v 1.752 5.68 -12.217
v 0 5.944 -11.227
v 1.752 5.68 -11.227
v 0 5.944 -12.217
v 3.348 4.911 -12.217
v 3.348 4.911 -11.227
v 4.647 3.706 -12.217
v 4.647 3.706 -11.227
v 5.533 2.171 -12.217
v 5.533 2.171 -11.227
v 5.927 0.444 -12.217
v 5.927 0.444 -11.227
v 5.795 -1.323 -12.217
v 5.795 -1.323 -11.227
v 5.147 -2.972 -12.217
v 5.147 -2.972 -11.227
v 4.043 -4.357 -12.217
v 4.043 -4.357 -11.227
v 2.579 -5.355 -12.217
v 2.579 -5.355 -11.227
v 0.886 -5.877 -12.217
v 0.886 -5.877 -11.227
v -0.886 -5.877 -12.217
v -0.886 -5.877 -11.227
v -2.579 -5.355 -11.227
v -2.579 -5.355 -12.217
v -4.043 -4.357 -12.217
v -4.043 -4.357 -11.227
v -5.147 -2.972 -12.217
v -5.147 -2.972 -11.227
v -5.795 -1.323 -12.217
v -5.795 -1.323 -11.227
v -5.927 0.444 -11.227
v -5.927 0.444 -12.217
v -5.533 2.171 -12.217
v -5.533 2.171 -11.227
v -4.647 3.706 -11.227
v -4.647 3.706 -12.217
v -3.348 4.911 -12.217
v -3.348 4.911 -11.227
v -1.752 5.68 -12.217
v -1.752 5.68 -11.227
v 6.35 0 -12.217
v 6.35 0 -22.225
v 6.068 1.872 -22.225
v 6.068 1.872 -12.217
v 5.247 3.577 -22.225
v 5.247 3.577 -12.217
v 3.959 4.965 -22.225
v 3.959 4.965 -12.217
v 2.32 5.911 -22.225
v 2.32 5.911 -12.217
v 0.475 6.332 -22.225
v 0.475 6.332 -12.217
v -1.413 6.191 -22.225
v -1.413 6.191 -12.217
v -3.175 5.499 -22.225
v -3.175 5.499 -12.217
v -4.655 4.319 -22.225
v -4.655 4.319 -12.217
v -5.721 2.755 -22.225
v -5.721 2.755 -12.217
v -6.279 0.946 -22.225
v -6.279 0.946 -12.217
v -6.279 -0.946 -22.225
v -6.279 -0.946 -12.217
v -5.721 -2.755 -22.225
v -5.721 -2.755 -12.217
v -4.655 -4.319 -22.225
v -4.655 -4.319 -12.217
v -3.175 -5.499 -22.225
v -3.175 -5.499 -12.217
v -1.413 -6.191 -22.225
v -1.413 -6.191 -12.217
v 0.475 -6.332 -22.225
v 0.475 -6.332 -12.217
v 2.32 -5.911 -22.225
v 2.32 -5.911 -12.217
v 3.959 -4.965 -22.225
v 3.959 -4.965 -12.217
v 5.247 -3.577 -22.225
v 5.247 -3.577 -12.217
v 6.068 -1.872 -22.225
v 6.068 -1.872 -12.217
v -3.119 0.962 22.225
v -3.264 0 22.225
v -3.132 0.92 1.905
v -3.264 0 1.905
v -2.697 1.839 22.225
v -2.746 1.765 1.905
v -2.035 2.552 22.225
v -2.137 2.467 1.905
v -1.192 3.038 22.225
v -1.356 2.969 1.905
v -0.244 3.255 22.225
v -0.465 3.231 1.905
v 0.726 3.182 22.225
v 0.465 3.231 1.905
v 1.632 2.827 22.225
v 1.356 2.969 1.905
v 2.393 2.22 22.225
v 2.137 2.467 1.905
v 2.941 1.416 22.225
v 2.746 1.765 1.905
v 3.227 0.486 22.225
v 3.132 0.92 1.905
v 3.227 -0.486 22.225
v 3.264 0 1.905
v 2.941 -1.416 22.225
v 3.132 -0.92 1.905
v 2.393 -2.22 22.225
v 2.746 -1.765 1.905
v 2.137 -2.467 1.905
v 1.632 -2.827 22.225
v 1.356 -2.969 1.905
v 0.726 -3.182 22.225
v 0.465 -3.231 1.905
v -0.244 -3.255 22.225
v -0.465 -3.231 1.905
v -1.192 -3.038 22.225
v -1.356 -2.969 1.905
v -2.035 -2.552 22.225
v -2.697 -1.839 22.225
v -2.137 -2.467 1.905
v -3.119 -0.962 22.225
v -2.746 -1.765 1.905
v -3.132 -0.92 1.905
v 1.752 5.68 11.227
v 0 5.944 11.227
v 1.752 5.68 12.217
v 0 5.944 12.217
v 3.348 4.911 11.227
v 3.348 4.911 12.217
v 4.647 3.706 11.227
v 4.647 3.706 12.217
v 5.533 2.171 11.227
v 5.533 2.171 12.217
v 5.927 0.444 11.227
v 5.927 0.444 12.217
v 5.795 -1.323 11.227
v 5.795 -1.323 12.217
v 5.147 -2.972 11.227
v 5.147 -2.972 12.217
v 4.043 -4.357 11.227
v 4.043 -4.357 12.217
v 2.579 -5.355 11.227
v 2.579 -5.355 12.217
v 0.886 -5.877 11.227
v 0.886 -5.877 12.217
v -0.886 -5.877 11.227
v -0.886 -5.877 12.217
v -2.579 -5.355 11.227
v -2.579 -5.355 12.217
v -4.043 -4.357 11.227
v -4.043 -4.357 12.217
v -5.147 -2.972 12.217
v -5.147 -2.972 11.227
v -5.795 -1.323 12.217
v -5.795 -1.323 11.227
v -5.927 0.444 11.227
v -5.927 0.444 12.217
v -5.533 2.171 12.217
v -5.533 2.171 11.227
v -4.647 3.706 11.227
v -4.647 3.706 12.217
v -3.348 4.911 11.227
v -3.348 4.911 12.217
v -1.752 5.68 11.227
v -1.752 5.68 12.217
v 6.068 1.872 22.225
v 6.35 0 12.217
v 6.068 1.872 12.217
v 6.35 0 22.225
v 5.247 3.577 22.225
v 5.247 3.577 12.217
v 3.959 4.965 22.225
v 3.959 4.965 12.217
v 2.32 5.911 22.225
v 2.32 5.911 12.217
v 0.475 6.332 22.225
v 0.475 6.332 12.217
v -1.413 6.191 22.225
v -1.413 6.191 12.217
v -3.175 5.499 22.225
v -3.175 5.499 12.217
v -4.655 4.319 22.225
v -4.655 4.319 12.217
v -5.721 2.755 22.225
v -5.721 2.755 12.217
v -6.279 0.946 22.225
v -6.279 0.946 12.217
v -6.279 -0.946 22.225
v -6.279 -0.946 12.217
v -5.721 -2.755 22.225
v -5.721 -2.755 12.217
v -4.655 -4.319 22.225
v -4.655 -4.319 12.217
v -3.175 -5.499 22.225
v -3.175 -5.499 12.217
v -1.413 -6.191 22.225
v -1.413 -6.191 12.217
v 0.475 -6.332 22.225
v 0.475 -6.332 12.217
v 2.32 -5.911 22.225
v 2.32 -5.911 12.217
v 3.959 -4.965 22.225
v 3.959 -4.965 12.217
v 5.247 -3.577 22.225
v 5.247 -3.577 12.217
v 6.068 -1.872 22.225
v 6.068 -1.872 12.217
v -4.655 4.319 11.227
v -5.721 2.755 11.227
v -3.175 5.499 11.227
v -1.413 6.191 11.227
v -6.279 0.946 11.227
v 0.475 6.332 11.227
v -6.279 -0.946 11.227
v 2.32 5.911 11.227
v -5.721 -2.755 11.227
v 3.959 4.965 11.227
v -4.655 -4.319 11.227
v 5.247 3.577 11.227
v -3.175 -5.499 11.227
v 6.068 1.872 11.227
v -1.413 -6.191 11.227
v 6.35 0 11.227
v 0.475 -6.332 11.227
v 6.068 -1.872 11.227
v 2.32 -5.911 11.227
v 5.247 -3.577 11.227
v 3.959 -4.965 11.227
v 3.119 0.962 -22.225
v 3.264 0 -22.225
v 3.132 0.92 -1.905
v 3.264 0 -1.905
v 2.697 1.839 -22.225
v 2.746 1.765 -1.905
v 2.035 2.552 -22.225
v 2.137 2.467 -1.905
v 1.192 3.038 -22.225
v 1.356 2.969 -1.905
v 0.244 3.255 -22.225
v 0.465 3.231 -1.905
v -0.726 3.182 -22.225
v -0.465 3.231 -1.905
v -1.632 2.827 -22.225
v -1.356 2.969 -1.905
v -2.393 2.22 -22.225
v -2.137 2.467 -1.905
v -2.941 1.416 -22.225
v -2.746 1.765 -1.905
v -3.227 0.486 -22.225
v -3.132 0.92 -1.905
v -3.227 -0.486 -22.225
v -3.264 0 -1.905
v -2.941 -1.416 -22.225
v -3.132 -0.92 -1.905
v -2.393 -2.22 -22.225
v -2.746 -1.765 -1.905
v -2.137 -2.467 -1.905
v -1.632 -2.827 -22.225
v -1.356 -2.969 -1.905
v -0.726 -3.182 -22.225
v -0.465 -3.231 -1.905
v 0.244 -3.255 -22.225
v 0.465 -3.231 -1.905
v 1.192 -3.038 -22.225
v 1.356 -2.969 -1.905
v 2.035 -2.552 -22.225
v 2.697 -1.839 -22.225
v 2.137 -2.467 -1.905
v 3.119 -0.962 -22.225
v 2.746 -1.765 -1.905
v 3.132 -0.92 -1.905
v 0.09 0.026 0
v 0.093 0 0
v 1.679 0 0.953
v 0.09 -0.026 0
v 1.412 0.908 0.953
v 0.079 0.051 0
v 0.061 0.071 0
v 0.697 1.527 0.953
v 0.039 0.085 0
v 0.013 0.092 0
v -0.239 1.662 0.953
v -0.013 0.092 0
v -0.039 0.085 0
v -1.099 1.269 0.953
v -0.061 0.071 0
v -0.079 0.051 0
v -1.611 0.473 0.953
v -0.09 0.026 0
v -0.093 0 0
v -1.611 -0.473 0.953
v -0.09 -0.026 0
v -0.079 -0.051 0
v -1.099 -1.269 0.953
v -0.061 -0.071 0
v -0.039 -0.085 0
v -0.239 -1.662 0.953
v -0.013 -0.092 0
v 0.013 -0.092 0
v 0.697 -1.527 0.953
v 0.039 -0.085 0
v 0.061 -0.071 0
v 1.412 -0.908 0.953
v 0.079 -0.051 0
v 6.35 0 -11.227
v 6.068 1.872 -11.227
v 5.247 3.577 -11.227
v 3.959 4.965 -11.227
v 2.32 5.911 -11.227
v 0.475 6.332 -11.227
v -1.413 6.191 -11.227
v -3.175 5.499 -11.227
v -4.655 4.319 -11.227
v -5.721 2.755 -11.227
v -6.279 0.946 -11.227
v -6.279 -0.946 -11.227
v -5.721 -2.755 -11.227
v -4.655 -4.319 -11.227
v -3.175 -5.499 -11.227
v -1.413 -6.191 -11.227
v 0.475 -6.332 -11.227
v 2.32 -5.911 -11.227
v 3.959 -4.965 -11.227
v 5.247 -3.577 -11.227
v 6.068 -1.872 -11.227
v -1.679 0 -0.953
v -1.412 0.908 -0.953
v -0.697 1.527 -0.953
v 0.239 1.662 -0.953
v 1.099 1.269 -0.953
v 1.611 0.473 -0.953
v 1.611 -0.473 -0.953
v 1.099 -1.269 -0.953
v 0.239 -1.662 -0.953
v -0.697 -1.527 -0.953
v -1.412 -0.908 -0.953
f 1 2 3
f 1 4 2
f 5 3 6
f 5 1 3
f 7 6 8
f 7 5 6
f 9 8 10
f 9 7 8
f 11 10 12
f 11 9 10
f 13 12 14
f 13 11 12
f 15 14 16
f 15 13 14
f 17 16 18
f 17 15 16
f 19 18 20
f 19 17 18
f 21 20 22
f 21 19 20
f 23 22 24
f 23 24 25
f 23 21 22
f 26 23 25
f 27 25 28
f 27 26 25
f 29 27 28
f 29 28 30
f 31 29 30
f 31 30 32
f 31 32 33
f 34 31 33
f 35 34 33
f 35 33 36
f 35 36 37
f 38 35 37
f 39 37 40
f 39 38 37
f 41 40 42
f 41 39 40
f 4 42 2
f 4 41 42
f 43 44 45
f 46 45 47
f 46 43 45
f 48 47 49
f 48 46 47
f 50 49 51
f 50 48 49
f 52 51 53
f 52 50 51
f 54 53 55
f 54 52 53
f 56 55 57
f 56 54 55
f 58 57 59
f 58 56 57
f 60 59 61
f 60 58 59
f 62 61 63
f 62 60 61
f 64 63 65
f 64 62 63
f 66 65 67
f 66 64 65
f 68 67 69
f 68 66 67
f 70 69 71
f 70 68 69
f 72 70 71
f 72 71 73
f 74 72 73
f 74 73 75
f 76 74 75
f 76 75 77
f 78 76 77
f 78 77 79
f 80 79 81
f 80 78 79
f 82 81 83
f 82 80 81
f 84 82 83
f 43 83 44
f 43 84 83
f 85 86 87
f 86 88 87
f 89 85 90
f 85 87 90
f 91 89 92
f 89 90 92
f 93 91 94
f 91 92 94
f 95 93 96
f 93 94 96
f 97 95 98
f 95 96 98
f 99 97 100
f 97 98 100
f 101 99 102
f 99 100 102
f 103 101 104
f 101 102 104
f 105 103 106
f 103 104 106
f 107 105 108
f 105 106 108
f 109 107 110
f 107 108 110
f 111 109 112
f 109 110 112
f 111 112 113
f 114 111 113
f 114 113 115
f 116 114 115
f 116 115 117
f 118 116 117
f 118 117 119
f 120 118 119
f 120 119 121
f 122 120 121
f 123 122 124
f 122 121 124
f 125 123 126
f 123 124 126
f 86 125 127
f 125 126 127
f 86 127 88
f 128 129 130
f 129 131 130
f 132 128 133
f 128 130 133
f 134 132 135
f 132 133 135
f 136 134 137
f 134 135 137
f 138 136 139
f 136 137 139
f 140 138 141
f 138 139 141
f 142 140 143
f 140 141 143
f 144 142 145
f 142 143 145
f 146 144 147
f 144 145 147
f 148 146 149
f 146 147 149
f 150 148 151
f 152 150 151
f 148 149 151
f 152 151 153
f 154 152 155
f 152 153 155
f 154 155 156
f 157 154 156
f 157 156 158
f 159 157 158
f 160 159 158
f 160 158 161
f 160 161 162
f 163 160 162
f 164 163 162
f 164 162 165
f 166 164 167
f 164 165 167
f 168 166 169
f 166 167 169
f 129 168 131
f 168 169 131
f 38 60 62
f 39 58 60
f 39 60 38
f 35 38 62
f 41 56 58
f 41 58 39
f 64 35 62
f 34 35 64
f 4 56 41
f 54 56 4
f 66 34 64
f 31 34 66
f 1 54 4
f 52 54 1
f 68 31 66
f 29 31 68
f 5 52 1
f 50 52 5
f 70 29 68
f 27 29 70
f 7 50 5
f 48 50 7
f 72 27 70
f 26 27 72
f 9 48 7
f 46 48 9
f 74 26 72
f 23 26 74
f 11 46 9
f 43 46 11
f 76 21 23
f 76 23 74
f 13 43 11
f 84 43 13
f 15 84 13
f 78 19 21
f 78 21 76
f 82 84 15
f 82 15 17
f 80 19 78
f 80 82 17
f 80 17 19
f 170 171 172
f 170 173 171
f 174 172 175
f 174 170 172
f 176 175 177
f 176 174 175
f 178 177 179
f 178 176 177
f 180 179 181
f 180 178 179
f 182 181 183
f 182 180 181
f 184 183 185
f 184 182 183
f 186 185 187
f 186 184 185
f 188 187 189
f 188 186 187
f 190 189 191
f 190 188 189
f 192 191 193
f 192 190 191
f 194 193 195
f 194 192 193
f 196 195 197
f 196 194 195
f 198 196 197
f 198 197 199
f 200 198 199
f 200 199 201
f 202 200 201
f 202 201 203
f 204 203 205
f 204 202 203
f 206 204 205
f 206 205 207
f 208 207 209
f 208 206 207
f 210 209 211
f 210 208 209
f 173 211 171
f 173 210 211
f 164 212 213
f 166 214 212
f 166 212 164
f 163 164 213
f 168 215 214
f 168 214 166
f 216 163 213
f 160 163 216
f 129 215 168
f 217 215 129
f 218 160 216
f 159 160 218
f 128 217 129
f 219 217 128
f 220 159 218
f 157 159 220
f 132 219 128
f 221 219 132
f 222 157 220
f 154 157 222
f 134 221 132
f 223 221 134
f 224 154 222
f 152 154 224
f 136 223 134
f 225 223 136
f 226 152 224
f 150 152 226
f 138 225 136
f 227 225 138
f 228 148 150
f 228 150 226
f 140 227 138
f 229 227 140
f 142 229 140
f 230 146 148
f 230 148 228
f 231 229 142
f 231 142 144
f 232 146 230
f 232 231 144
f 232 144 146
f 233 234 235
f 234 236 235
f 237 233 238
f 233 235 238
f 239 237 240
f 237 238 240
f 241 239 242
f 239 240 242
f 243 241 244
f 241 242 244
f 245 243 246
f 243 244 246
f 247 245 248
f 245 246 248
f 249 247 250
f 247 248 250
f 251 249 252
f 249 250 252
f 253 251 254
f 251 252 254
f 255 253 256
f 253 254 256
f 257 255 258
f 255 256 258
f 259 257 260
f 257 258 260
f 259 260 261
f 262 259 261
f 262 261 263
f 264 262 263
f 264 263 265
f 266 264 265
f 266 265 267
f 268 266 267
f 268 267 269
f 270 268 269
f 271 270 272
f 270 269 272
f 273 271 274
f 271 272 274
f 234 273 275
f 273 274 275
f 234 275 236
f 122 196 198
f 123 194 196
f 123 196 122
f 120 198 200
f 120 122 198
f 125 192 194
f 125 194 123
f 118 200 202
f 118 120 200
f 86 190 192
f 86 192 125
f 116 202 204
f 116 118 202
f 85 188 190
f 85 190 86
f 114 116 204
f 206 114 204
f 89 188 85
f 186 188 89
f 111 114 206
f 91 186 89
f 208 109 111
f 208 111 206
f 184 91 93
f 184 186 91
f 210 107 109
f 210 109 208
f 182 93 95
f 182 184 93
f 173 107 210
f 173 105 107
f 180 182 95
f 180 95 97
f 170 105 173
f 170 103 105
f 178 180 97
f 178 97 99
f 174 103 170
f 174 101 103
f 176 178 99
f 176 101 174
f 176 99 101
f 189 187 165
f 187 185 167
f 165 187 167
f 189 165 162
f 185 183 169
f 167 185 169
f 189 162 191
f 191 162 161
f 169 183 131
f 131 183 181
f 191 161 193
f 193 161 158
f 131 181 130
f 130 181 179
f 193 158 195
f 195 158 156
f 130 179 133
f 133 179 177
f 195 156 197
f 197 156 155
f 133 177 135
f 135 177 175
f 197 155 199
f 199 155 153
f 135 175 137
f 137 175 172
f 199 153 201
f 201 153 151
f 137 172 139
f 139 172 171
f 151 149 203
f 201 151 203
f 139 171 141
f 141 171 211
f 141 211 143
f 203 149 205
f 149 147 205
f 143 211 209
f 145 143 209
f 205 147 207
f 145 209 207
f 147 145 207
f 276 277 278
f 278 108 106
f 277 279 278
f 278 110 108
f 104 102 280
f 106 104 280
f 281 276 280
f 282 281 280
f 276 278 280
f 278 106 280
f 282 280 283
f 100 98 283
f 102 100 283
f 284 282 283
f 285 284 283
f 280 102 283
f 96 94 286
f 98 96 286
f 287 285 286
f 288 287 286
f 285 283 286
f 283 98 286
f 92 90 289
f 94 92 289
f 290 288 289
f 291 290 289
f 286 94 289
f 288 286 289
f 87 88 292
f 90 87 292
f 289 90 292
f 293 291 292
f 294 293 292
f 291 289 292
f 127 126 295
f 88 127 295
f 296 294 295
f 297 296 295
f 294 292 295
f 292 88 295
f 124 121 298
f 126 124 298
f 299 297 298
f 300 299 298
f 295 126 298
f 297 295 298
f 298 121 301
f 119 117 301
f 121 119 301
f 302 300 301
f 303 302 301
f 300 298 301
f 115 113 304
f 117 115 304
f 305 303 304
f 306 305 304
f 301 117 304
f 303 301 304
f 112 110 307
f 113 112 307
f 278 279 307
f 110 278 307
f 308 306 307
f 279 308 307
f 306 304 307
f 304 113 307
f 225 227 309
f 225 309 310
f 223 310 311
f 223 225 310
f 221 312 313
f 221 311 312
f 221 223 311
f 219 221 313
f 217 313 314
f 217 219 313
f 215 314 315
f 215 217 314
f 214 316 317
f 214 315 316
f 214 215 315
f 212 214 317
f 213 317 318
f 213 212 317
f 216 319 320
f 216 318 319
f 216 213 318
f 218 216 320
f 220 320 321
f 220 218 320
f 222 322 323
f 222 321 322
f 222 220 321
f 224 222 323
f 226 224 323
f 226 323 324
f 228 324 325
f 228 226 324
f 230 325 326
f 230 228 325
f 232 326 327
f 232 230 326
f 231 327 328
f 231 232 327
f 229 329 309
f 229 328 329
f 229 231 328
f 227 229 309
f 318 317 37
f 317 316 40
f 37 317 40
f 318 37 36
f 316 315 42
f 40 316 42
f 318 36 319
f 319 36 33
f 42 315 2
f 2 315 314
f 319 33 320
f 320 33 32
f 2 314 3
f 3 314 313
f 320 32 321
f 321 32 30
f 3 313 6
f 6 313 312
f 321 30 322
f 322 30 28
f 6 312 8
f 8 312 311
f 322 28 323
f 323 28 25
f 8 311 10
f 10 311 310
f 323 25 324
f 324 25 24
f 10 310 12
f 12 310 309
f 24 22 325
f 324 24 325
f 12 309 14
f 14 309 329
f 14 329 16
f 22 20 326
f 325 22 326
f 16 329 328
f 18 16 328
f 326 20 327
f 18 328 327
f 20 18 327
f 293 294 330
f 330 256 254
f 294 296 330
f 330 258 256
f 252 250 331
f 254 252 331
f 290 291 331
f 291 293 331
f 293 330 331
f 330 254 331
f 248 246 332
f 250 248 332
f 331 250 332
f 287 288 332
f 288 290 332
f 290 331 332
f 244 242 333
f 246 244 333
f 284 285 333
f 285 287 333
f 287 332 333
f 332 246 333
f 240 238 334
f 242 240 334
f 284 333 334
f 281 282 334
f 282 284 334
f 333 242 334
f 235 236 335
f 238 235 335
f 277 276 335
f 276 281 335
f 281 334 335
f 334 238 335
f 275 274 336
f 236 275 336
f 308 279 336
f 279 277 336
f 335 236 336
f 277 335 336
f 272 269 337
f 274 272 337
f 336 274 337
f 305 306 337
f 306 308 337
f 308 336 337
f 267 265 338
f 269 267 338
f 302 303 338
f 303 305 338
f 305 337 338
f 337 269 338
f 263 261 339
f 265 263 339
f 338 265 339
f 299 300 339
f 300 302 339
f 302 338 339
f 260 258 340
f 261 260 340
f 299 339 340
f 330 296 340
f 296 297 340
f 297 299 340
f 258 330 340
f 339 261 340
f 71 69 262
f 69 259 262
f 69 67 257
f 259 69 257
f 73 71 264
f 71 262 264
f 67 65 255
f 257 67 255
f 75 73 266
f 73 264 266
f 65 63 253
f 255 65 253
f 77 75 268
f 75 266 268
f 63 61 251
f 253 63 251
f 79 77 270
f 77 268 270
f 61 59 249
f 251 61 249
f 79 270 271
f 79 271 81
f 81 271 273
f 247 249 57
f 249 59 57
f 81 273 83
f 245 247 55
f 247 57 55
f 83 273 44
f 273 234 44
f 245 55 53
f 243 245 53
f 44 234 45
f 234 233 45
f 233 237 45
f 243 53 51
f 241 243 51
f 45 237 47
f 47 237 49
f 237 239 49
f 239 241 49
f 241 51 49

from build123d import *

# Parameters (mm, degrees)
SKETCH1_R                    = 6.35
EXTRUDE1_DEPTH               = 22.225
F_5_16_18_TAPPED_HOLE1_D     = 6.5278
F_5_16_18_TAPPED_HOLE1_DEPTH = 20.32
F_5_16_18_TAPPED_HOLE1_TIP   = 1.961148974
F_5_16_18_TAPPED_HOLE2_D     = 6.5278
F_5_16_18_TAPPED_HOLE2_DEPTH = 20.32
F_5_16_18_TAPPED_HOLE2_TIP   = 1.961148974
SKETCH6_W                    = 0.9906
SKETCH6_H                    = 0.4064


with BuildPart() as part:
    # Sketch1 → Extrude1 (new body, symmetric)
    with BuildSketch(Plane.XY):
        Circle(SKETCH1_R)
    extrude(amount=EXTRUDE1_DEPTH, both=True)

    # 5/16-18 Tapped Hole1
    with Locations(Plane.XY.offset(22.225)):
        with Locations((0, 0)):
            Hole(F_5_16_18_TAPPED_HOLE1_D / 2, depth=F_5_16_18_TAPPED_HOLE1_DEPTH)
            with Locations((0, 0, -(F_5_16_18_TAPPED_HOLE1_DEPTH + F_5_16_18_TAPPED_HOLE1_TIP / 2))):  # 118° drill point
                Cone(0, F_5_16_18_TAPPED_HOLE1_D / 2, F_5_16_18_TAPPED_HOLE1_TIP, mode=Mode.SUBTRACT)

    # 5/16-18 Tapped Hole2
    with Locations(Plane(origin=(0, 0, -22.225), x_dir=(-1, 0, 0), z_dir=(0, 0, -1))):
        with Locations((0, 0)):
            Hole(F_5_16_18_TAPPED_HOLE2_D / 2, depth=F_5_16_18_TAPPED_HOLE2_DEPTH)
            with Locations((0, 0, -(F_5_16_18_TAPPED_HOLE2_DEPTH + F_5_16_18_TAPPED_HOLE2_TIP / 2))):  # 118° drill point
                Cone(0, F_5_16_18_TAPPED_HOLE2_D / 2, F_5_16_18_TAPPED_HOLE2_TIP, mode=Mode.SUBTRACT)

    # Sketch6 → Cut-Revolve1 (revolve, cut)
    with BuildSketch(Plane(origin=(0, 0, 0), x_dir=(0, 0, -1), z_dir=(1, 0, 0))):
        with Locations((11.7221, 6.1468)):
            Rectangle(SKETCH6_W, SKETCH6_H)
    cut_revolve1 = revolve(axis=Axis((0, 0, 22.225), (0, 0, -1)), mode=Mode.SUBTRACT)

    # Mirror1: Cut-Revolve1 across plane
    add(cut_revolve1.mirror(Plane.XY), mode=Mode.SUBTRACT)


solid = part.part
